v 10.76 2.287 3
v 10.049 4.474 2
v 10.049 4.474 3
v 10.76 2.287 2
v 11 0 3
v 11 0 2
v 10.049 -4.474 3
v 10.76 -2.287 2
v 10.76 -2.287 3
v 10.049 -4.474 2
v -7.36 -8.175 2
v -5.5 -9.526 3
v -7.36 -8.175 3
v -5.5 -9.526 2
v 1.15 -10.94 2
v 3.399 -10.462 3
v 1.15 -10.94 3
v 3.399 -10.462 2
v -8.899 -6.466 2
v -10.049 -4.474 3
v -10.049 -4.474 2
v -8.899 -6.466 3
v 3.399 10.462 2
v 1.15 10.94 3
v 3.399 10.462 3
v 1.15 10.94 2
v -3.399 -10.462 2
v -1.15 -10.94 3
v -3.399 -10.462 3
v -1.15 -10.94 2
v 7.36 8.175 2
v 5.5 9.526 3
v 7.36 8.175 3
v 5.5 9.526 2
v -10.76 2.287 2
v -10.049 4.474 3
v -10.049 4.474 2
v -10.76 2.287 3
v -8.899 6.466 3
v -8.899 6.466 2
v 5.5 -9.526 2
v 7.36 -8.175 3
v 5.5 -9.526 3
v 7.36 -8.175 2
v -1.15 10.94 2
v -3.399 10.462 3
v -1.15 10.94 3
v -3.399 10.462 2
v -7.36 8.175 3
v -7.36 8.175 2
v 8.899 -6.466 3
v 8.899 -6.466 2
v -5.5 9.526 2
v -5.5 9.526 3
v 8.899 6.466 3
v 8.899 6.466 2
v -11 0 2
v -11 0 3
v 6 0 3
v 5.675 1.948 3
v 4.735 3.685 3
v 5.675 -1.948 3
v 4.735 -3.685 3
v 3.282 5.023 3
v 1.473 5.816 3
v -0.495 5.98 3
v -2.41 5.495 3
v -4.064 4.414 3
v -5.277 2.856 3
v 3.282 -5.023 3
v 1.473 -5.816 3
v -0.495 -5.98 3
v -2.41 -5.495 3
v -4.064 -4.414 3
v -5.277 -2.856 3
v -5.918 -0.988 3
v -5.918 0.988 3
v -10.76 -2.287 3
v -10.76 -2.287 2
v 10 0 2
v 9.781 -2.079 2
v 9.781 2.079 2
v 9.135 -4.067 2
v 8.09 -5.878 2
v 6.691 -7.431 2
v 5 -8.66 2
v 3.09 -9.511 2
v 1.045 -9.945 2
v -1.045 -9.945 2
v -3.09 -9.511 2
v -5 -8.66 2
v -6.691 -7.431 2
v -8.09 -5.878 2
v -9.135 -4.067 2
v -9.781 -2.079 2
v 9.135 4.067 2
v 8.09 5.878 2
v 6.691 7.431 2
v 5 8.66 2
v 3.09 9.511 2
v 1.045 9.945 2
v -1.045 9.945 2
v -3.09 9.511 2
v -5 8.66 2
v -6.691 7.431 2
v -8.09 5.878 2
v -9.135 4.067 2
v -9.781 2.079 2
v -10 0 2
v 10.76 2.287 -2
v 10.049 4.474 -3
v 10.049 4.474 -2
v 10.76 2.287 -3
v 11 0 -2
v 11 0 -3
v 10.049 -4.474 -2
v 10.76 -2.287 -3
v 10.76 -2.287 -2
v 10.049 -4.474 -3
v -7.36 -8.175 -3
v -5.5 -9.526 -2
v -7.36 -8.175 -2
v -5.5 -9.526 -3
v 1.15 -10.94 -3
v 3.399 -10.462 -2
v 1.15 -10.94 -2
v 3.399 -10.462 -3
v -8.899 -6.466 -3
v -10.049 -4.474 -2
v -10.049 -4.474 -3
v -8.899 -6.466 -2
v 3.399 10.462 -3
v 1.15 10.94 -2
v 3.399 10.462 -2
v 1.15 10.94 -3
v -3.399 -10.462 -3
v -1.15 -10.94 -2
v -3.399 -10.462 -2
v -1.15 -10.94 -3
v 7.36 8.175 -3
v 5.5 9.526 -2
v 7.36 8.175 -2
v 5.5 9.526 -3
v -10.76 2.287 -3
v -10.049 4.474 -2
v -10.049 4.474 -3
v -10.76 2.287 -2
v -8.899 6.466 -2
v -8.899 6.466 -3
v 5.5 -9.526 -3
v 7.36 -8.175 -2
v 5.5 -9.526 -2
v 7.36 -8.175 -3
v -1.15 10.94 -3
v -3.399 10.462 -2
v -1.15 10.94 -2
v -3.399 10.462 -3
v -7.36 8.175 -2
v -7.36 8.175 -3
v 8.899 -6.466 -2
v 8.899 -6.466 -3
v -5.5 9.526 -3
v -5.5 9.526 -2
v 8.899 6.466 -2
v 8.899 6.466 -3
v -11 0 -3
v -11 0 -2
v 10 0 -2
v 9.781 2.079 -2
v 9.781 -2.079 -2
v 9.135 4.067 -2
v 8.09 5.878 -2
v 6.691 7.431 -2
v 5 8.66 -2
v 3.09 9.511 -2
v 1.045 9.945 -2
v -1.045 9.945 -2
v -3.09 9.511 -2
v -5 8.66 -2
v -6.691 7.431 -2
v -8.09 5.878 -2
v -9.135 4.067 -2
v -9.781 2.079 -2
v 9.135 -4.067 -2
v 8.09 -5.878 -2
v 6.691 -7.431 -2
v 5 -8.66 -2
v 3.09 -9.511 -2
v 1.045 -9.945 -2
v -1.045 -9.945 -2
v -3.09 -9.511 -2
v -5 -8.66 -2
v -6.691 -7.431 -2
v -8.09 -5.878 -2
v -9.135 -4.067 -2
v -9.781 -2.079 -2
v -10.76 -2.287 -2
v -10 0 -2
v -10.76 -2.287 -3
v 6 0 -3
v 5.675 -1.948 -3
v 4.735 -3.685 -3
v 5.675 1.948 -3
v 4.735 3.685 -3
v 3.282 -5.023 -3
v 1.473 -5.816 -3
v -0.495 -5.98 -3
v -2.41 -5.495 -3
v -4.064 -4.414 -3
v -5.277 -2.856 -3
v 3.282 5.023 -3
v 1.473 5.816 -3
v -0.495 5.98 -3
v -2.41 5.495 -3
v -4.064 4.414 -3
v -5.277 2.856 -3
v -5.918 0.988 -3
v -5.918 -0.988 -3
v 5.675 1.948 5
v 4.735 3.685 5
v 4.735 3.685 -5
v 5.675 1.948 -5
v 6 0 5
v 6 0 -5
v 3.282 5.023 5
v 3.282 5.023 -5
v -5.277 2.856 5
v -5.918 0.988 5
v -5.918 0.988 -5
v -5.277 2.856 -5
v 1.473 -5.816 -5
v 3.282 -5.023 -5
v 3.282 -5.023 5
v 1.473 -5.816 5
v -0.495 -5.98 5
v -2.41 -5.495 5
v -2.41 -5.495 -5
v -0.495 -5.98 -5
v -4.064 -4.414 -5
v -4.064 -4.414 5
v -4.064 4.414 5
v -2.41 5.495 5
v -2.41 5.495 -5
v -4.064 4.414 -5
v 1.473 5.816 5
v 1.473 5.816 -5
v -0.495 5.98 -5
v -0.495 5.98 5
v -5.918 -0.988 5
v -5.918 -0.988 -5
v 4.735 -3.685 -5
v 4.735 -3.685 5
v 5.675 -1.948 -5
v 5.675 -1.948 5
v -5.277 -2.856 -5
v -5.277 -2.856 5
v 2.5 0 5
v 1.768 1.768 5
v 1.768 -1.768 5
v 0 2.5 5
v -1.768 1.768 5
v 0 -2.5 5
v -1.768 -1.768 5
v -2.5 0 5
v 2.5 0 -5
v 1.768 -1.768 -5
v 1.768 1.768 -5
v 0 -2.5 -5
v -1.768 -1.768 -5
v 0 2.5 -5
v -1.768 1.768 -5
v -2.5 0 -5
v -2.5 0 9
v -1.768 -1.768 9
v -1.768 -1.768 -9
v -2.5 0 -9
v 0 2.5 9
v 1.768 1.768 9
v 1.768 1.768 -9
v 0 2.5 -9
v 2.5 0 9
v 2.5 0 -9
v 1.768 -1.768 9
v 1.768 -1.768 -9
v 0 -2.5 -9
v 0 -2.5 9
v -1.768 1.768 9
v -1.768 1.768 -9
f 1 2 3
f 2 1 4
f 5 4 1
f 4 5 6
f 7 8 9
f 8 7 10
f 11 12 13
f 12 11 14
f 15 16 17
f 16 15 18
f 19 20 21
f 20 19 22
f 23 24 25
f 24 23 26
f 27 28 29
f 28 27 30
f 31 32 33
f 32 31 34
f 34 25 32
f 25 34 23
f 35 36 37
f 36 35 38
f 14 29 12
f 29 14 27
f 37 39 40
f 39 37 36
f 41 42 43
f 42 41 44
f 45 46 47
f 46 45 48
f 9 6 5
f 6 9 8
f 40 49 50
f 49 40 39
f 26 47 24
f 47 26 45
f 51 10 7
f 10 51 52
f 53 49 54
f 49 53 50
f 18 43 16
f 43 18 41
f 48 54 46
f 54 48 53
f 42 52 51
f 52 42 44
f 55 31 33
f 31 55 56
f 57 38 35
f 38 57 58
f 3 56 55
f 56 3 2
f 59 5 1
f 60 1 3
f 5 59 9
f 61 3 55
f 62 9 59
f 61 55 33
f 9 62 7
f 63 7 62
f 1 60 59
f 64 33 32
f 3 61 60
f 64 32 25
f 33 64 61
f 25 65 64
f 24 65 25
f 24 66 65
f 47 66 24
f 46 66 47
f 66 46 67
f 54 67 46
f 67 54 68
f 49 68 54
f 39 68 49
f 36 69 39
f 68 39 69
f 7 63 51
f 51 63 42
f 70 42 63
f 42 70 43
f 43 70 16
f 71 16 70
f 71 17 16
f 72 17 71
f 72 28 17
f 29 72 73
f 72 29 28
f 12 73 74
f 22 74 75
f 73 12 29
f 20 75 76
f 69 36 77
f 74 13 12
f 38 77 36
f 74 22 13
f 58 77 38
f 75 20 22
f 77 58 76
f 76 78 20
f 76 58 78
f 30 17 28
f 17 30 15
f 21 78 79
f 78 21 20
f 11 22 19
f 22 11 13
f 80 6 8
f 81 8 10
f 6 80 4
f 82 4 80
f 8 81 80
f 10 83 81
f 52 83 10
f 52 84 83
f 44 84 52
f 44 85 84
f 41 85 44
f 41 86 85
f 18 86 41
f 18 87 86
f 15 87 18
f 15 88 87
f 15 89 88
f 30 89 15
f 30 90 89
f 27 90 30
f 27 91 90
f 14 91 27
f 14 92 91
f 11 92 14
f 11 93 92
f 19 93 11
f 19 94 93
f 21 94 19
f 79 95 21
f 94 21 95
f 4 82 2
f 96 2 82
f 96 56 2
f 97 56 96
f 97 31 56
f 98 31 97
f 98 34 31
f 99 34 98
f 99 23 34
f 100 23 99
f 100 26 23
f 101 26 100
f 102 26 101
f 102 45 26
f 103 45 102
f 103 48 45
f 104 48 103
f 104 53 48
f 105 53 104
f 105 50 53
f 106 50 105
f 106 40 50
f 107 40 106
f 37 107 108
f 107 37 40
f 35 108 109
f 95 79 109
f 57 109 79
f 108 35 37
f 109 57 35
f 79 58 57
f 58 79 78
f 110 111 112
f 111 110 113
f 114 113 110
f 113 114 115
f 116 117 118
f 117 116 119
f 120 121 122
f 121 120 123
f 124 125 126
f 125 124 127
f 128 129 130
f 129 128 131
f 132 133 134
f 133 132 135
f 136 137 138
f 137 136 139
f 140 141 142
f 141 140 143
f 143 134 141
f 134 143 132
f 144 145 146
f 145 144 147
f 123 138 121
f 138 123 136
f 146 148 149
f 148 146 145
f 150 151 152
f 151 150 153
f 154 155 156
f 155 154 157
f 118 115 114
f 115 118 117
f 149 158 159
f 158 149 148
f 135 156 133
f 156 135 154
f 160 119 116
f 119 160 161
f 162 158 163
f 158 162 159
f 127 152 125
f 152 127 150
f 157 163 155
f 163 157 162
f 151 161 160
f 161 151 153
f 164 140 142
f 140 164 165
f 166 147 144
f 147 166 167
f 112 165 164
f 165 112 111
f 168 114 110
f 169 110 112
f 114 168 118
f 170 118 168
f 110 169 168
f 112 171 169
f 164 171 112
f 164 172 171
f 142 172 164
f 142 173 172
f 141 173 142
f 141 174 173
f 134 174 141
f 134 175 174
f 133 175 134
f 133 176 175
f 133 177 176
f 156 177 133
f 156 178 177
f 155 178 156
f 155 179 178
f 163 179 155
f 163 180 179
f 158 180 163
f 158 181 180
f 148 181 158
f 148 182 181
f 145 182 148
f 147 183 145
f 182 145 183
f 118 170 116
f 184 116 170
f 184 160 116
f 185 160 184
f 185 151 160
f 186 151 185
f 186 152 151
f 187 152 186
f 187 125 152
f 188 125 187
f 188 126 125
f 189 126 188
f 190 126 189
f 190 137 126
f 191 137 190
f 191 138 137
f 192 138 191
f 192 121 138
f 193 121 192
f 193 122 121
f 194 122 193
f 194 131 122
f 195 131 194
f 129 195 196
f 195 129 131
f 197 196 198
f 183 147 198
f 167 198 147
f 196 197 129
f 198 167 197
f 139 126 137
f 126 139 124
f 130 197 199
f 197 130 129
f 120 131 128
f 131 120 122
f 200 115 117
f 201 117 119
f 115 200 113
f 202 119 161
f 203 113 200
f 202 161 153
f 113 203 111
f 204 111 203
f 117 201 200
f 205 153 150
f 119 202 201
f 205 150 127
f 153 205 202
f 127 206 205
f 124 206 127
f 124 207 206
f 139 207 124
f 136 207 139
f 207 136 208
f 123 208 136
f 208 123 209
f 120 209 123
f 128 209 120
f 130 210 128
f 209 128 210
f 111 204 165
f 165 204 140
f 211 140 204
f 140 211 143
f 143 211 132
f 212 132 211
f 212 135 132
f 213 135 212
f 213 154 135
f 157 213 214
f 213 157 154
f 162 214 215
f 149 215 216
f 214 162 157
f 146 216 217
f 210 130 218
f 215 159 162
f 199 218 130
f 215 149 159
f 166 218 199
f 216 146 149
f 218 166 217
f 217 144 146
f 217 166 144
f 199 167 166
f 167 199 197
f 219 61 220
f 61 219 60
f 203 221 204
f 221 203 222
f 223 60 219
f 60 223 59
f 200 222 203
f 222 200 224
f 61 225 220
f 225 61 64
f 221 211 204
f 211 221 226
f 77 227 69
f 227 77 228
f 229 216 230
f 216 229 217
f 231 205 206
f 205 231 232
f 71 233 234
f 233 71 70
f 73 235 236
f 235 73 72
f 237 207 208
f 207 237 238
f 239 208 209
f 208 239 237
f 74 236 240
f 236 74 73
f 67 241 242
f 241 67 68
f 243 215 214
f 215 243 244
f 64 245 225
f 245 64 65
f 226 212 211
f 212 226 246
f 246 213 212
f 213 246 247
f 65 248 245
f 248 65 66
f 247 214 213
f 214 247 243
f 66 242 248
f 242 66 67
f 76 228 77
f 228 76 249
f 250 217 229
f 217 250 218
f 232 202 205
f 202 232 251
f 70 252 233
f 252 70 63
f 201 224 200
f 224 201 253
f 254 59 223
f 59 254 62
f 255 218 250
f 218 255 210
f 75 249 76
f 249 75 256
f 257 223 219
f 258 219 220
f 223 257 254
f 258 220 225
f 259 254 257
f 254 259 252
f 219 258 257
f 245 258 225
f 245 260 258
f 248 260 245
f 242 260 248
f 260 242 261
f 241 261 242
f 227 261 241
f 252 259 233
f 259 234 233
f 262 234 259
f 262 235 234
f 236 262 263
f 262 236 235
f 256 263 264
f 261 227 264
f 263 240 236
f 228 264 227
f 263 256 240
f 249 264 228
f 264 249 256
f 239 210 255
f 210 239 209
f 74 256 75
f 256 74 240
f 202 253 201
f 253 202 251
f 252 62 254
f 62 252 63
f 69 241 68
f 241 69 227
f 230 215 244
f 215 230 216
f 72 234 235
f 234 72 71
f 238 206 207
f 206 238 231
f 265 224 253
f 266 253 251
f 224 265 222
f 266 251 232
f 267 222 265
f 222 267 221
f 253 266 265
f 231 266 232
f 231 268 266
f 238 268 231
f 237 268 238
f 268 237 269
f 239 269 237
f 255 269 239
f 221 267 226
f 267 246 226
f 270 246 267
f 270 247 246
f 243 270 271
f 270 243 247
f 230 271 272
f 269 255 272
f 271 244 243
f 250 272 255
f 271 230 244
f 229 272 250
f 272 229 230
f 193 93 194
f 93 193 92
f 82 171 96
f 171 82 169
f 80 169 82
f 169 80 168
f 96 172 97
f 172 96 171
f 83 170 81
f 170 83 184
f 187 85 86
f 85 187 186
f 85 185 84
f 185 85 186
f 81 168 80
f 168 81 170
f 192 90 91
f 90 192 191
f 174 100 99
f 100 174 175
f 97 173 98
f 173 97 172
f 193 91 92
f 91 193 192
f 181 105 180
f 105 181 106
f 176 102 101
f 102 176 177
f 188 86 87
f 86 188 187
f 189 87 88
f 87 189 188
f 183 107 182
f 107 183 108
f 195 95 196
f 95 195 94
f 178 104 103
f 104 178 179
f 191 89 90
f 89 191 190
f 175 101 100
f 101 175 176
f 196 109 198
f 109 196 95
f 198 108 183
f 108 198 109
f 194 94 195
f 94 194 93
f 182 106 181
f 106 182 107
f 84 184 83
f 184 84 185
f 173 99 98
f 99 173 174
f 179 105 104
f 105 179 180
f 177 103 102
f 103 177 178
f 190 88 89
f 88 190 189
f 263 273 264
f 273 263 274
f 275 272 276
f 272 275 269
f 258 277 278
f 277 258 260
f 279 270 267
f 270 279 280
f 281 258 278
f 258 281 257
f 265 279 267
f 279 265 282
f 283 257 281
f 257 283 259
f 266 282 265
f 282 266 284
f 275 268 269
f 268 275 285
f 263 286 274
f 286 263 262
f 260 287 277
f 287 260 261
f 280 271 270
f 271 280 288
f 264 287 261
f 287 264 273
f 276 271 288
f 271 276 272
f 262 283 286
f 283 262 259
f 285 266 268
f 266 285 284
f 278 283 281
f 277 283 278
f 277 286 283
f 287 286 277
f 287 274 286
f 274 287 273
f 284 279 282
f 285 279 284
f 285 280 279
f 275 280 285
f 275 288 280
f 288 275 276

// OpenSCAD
// Parameters
pulley_type_timing = 0; //[0:1:1]
teeth_count = 20; //[10:60:1]
outer_diameter_mm = 20; //[10:40:1]
belt_width_mm = 6; //[3:20:1]
bore_diameter_mm = 5; //[2:12:0.5]
hub_diameter_mm = 12; //[6:24:1]
hub_length_mm = 10; //[5:25:1]
flange_enabled = 1; //[0:1:1]
flange_diameter_mm = 22; //[12:44:1]
flange_thickness_mm = 1; //[1:4:0.5]
set_screw_count = 0; //[0:2:1]
set_screw_diameter_mm = 3; //[2:6:0.5]
set_screw_z_offset_mm = 5; //[0:20:0.5]
flat_enabled = 0; //[0:1:1]
flat_depth_mm = 0.8; //[0.4:2:0.1]
tooth_radial_height_mm = 1.2; //[0.6:2.5:0.1]
tooth_tangential_width_mm = 1.2; //[0.6:3:0.1]
rim_overlap_mm = 1; //[0.5:2:0.1]

// Pulley module
module pulley() {
  color("Silver") {
    // Hub
    translate([0, 0, 0])
      cylinder(r=hub_diameter_mm/2, h=hub_length_mm, center=true);

    // Pulley body
    translate([0, 0, 0])
      cylinder(r=outer_diameter_mm/2, h=belt_width_mm, center=true);

    // Flanges
    if (flange_enabled) {
      translate([0, 0, belt_width_mm/2 + flange_thickness_mm/2 - rim_overlap_mm])
        cylinder(r=flange_diameter_mm/2, h=flange_thickness_mm, center=true);
      translate([0, 0, -belt_width_mm/2 - flange_thickness_mm/2 + rim_overlap_mm])
        cylinder(r=flange_diameter_mm/2, h=flange_thickness_mm, center=true);
    }

    // Teeth
    if (pulley_type_timing) {
      for (i = [0:teeth_count-1]) {
        rotate([0, 0, i*360/teeth_count])
          translate([outer_diameter_mm/2 - tooth_radial_height_mm/2, 0, 0])
          cube([tooth_radial_height_mm, tooth_tangential_width_mm, belt_width_mm], center=true);
      }
    }

    // Bore
    translate([0, 0, 0])
      cylinder(r=bore_diameter_mm/2, h=hub_length_mm + belt_width_mm + 2*flange_thickness_mm, center=true);

    // Set screw holes
    if (set_screw_count > 0) {
      for (i = [0:set_screw_count-1]) {
        rotate([0, 0, i*180])
          translate([0, 0, -hub_length_mm/2 + set_screw_z_offset_mm])
          rotate([0, 90, 0])
          cylinder(r=set_screw_diameter_mm/2, h=hub_diameter_mm + 2*outer_diameter_mm, center=true);
      }
    }

    // Flat cut
    if (flat_enabled) {
      translate([bore_diameter_mm/2 - flat_depth_mm/2, 0, 0])
        cube([bore_diameter_mm, bore_diameter_mm*2, hub_length_mm + belt_width_mm + 2*flange_thickness_mm], center=true);
    }
  }
}

// Assembly
module assembly() {
  pulley();
}

assembly();
